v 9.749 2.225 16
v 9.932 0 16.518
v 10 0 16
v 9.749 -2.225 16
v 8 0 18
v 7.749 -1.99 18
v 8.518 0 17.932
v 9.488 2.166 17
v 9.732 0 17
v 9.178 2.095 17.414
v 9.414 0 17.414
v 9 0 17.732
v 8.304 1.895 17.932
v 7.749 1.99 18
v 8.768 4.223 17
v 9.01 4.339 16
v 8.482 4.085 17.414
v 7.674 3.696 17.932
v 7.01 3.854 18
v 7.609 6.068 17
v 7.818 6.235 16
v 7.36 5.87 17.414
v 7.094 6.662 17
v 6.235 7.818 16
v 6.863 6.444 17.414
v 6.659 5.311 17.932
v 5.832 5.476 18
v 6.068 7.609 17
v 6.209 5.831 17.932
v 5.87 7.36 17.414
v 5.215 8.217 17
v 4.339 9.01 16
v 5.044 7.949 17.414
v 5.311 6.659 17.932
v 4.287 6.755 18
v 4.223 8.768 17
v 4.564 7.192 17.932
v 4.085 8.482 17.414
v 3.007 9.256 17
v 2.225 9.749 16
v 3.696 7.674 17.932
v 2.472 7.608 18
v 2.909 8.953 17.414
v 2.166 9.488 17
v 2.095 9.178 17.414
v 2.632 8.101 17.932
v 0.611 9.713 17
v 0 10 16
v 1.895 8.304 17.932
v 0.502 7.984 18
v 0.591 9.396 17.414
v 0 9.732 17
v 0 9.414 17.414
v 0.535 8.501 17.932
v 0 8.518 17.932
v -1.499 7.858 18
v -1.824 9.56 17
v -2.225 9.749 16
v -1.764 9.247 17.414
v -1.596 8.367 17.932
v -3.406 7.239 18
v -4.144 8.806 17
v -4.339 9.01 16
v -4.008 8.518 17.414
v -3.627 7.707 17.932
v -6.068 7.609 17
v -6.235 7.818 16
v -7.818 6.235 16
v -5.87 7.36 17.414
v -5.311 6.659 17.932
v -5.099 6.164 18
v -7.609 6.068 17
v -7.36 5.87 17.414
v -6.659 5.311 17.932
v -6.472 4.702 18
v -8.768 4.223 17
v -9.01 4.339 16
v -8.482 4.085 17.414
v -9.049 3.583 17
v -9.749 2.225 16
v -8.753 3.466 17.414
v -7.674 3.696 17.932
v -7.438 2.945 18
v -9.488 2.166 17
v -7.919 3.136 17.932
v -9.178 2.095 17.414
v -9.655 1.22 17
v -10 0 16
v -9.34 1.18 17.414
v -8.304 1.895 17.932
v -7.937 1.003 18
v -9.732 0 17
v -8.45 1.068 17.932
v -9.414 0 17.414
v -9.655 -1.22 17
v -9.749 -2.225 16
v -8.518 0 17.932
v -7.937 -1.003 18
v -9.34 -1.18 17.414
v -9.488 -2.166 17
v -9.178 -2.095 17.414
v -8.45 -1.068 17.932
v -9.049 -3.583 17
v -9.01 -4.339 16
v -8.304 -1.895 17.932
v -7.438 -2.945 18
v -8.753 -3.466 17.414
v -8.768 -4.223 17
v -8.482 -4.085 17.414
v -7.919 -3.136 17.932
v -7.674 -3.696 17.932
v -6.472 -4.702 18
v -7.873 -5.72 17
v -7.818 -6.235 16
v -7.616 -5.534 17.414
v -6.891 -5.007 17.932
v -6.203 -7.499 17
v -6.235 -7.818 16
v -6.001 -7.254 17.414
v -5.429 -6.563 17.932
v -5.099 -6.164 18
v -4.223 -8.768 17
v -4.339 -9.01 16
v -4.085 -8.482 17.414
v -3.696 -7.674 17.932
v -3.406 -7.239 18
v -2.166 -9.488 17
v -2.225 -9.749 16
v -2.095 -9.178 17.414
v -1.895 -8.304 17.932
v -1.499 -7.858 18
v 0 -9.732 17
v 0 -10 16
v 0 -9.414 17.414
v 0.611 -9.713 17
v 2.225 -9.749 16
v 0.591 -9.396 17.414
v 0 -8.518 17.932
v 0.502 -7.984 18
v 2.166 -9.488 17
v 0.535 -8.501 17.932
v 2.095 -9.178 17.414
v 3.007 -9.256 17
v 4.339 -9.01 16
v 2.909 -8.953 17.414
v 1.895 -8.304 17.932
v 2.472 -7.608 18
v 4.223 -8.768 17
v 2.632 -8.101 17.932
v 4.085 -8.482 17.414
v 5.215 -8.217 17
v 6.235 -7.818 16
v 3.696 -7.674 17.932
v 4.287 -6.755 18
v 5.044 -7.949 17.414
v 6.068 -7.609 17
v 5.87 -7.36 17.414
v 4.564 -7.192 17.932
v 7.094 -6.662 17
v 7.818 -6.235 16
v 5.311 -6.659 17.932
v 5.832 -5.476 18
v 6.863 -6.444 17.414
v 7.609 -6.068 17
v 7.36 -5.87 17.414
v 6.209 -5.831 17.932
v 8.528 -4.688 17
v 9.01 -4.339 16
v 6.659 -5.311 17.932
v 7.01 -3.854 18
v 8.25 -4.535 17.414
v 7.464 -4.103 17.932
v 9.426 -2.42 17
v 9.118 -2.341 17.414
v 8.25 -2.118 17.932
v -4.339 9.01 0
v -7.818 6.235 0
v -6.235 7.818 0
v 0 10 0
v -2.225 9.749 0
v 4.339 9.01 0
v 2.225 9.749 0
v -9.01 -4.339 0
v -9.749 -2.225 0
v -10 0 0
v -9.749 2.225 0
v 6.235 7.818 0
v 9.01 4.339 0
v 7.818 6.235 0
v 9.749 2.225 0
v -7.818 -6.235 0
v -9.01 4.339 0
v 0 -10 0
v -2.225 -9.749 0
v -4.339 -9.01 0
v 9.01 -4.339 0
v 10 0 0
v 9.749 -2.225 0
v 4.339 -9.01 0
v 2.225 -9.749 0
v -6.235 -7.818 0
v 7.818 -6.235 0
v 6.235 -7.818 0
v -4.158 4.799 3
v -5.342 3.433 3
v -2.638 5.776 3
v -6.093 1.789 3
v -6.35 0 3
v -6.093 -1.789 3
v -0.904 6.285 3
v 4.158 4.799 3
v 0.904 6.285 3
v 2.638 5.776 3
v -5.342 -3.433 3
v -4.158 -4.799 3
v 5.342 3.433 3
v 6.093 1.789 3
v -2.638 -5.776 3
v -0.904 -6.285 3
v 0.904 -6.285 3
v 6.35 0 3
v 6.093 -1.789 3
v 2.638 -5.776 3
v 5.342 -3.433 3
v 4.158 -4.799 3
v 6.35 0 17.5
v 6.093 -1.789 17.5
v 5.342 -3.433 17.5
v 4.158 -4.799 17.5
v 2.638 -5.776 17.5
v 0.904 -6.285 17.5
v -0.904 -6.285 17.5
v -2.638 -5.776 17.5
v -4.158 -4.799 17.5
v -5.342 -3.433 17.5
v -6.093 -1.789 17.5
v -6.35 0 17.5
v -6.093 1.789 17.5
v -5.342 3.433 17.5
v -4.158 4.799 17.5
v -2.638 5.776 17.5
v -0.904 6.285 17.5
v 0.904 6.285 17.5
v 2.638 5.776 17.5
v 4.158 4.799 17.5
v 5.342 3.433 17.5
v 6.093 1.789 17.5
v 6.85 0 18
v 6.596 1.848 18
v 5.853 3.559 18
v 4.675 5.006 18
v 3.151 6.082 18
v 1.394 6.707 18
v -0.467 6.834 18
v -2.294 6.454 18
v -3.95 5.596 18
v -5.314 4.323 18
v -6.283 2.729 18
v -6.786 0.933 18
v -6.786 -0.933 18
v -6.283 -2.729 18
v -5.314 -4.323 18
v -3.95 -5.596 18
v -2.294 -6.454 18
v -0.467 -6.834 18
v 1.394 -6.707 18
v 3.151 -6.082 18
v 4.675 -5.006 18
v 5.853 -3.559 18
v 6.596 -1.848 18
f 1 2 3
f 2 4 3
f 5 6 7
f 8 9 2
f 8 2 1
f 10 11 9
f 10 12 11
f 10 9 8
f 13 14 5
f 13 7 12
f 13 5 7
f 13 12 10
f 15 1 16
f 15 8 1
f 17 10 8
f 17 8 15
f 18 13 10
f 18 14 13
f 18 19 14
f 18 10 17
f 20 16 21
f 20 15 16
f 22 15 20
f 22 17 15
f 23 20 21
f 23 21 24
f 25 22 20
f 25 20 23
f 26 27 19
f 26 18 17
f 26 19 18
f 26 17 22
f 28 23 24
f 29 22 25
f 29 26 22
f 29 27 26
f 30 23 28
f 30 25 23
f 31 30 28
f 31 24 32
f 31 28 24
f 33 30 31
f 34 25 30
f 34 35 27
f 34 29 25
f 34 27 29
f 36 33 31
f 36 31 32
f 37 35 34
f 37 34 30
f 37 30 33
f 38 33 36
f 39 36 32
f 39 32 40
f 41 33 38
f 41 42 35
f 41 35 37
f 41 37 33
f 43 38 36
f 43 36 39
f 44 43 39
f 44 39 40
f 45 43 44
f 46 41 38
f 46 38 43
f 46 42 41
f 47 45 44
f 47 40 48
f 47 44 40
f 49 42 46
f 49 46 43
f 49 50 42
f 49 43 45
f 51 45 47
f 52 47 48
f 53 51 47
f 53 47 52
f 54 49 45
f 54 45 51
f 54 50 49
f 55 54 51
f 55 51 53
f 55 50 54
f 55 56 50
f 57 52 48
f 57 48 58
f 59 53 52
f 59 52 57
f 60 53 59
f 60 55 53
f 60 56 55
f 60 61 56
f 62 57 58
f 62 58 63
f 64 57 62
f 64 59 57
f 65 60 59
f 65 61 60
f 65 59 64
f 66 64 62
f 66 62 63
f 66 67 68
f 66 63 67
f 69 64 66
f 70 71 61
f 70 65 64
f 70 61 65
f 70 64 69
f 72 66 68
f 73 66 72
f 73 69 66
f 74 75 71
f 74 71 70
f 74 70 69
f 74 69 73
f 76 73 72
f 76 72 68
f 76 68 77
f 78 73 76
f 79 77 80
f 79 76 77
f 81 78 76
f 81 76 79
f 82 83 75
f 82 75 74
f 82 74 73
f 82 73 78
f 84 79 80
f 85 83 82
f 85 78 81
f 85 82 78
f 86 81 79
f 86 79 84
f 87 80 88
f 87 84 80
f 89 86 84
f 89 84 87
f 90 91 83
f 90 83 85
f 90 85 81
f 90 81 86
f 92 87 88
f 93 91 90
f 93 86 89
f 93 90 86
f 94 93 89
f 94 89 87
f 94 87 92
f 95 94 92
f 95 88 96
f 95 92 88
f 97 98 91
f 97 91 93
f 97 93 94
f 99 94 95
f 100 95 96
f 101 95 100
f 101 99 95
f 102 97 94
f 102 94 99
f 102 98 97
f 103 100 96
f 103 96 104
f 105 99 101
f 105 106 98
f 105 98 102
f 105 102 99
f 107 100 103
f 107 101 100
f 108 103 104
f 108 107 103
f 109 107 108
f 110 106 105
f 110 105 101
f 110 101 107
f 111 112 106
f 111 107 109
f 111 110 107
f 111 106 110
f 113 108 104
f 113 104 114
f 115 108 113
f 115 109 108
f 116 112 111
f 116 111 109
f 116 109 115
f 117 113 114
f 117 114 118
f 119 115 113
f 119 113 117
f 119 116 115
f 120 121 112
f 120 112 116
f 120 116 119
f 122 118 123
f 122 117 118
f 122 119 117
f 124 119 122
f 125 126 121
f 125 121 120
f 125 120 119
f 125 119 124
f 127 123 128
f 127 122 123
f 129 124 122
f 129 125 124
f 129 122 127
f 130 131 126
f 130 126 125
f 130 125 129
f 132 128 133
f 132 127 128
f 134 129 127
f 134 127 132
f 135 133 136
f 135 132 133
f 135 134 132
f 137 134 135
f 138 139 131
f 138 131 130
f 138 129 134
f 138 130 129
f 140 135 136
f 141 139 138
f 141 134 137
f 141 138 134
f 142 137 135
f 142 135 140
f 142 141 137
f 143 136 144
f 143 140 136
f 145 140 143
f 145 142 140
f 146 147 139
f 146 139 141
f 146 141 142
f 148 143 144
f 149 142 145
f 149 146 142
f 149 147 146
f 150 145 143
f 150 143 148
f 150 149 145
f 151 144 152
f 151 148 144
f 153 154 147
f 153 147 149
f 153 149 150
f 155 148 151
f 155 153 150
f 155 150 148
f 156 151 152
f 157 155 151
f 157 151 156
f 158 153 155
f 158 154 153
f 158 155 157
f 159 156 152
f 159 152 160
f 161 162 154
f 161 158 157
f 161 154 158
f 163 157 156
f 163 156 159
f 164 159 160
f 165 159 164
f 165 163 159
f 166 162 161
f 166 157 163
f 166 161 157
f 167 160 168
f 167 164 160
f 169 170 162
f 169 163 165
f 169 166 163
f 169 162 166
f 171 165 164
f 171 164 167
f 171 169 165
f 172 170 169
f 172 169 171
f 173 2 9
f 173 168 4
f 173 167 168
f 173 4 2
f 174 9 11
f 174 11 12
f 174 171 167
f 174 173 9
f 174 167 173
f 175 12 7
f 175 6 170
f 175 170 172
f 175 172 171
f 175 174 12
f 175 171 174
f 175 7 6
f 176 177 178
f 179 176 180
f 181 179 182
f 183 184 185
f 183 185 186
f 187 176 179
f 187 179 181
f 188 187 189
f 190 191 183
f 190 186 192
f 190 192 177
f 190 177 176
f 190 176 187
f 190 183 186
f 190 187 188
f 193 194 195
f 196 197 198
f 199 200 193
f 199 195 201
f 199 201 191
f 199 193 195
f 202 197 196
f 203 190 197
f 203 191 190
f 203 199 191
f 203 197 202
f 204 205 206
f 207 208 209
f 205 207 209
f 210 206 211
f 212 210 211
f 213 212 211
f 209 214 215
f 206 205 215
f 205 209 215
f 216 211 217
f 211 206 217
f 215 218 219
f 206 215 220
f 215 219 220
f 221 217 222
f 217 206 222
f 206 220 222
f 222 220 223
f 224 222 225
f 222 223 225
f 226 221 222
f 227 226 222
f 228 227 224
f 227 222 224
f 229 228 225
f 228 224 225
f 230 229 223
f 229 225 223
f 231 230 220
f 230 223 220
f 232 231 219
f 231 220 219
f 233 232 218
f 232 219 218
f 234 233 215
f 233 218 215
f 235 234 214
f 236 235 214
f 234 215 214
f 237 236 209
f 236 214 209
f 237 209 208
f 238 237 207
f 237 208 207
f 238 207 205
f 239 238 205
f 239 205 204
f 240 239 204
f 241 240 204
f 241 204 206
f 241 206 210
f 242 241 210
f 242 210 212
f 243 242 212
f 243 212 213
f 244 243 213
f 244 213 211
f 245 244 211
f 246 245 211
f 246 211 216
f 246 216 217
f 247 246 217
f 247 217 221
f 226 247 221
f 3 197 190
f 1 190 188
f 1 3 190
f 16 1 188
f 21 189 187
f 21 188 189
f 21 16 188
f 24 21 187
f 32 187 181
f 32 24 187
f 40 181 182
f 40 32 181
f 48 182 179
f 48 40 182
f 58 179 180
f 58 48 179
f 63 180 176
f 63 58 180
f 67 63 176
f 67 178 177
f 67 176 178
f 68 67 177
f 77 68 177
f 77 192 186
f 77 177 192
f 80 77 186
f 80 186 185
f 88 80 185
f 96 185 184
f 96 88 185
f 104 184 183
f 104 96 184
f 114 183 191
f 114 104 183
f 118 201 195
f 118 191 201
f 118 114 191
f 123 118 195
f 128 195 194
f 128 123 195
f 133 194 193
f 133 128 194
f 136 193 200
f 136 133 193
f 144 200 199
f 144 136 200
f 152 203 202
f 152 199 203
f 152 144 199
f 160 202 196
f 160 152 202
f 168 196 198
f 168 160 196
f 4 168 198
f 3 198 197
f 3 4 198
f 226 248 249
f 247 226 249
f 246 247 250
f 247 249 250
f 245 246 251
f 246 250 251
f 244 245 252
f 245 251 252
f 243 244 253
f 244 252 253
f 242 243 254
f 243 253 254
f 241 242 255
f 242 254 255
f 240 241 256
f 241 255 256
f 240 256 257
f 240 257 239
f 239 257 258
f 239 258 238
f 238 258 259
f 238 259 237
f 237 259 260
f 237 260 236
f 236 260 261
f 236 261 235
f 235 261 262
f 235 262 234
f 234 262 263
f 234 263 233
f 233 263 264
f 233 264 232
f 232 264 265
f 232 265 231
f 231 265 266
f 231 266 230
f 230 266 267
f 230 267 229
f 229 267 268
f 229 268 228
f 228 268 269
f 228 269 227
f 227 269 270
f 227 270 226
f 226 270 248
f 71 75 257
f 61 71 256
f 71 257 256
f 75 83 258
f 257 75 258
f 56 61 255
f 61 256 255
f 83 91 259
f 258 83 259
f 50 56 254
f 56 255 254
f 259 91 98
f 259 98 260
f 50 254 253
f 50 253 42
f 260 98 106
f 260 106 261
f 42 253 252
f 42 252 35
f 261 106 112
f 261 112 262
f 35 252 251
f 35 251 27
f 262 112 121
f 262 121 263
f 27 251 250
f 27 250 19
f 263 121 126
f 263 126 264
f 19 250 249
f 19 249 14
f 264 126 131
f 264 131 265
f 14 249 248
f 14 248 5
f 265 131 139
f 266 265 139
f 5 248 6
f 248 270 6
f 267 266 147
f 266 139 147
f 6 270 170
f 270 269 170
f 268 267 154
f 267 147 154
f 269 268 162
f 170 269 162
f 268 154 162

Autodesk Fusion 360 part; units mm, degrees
sketch "Sketch1" plane through (0, 0, 0) normal (0, 1, 0) x (1, 0, 0)
  line L0 (0, 0) -> (10, 0)
  line L1 (10, 0) -> (10, -3)
  line L2 (10, -3) -> (0, -3)
  line L3 (0, -3) -> (0, 0)
  line L4 (0, -3) -> (6.35, -3)
  line L5 (10, -3) -> (6.35, -3)
  line L6 (6.35, -3) -> (10, -3)
  line L7 (10, -3) -> (10, -18)
  line L8 (10, -18) -> (6.35, -18)
  line L9 (6.35, -18) -> (6.35, -3)
  dimension "d1" = 10
  dimension "d2" = 3
  dimension "d3" = 6.35
  dimension "d5" = 15
revolve "Revolve1" add sketch "Sketch1" angle 360 about axis through (0, 0, 3) along (0, 0, -1)
fillet "Fillet1" radius 2 1 edges at (-9.3233, -3.6162, 18)
chamfer "Chamfer1" distance 0.5 angle 45 1 edges at (-5.9203, -2.2963, 18)
